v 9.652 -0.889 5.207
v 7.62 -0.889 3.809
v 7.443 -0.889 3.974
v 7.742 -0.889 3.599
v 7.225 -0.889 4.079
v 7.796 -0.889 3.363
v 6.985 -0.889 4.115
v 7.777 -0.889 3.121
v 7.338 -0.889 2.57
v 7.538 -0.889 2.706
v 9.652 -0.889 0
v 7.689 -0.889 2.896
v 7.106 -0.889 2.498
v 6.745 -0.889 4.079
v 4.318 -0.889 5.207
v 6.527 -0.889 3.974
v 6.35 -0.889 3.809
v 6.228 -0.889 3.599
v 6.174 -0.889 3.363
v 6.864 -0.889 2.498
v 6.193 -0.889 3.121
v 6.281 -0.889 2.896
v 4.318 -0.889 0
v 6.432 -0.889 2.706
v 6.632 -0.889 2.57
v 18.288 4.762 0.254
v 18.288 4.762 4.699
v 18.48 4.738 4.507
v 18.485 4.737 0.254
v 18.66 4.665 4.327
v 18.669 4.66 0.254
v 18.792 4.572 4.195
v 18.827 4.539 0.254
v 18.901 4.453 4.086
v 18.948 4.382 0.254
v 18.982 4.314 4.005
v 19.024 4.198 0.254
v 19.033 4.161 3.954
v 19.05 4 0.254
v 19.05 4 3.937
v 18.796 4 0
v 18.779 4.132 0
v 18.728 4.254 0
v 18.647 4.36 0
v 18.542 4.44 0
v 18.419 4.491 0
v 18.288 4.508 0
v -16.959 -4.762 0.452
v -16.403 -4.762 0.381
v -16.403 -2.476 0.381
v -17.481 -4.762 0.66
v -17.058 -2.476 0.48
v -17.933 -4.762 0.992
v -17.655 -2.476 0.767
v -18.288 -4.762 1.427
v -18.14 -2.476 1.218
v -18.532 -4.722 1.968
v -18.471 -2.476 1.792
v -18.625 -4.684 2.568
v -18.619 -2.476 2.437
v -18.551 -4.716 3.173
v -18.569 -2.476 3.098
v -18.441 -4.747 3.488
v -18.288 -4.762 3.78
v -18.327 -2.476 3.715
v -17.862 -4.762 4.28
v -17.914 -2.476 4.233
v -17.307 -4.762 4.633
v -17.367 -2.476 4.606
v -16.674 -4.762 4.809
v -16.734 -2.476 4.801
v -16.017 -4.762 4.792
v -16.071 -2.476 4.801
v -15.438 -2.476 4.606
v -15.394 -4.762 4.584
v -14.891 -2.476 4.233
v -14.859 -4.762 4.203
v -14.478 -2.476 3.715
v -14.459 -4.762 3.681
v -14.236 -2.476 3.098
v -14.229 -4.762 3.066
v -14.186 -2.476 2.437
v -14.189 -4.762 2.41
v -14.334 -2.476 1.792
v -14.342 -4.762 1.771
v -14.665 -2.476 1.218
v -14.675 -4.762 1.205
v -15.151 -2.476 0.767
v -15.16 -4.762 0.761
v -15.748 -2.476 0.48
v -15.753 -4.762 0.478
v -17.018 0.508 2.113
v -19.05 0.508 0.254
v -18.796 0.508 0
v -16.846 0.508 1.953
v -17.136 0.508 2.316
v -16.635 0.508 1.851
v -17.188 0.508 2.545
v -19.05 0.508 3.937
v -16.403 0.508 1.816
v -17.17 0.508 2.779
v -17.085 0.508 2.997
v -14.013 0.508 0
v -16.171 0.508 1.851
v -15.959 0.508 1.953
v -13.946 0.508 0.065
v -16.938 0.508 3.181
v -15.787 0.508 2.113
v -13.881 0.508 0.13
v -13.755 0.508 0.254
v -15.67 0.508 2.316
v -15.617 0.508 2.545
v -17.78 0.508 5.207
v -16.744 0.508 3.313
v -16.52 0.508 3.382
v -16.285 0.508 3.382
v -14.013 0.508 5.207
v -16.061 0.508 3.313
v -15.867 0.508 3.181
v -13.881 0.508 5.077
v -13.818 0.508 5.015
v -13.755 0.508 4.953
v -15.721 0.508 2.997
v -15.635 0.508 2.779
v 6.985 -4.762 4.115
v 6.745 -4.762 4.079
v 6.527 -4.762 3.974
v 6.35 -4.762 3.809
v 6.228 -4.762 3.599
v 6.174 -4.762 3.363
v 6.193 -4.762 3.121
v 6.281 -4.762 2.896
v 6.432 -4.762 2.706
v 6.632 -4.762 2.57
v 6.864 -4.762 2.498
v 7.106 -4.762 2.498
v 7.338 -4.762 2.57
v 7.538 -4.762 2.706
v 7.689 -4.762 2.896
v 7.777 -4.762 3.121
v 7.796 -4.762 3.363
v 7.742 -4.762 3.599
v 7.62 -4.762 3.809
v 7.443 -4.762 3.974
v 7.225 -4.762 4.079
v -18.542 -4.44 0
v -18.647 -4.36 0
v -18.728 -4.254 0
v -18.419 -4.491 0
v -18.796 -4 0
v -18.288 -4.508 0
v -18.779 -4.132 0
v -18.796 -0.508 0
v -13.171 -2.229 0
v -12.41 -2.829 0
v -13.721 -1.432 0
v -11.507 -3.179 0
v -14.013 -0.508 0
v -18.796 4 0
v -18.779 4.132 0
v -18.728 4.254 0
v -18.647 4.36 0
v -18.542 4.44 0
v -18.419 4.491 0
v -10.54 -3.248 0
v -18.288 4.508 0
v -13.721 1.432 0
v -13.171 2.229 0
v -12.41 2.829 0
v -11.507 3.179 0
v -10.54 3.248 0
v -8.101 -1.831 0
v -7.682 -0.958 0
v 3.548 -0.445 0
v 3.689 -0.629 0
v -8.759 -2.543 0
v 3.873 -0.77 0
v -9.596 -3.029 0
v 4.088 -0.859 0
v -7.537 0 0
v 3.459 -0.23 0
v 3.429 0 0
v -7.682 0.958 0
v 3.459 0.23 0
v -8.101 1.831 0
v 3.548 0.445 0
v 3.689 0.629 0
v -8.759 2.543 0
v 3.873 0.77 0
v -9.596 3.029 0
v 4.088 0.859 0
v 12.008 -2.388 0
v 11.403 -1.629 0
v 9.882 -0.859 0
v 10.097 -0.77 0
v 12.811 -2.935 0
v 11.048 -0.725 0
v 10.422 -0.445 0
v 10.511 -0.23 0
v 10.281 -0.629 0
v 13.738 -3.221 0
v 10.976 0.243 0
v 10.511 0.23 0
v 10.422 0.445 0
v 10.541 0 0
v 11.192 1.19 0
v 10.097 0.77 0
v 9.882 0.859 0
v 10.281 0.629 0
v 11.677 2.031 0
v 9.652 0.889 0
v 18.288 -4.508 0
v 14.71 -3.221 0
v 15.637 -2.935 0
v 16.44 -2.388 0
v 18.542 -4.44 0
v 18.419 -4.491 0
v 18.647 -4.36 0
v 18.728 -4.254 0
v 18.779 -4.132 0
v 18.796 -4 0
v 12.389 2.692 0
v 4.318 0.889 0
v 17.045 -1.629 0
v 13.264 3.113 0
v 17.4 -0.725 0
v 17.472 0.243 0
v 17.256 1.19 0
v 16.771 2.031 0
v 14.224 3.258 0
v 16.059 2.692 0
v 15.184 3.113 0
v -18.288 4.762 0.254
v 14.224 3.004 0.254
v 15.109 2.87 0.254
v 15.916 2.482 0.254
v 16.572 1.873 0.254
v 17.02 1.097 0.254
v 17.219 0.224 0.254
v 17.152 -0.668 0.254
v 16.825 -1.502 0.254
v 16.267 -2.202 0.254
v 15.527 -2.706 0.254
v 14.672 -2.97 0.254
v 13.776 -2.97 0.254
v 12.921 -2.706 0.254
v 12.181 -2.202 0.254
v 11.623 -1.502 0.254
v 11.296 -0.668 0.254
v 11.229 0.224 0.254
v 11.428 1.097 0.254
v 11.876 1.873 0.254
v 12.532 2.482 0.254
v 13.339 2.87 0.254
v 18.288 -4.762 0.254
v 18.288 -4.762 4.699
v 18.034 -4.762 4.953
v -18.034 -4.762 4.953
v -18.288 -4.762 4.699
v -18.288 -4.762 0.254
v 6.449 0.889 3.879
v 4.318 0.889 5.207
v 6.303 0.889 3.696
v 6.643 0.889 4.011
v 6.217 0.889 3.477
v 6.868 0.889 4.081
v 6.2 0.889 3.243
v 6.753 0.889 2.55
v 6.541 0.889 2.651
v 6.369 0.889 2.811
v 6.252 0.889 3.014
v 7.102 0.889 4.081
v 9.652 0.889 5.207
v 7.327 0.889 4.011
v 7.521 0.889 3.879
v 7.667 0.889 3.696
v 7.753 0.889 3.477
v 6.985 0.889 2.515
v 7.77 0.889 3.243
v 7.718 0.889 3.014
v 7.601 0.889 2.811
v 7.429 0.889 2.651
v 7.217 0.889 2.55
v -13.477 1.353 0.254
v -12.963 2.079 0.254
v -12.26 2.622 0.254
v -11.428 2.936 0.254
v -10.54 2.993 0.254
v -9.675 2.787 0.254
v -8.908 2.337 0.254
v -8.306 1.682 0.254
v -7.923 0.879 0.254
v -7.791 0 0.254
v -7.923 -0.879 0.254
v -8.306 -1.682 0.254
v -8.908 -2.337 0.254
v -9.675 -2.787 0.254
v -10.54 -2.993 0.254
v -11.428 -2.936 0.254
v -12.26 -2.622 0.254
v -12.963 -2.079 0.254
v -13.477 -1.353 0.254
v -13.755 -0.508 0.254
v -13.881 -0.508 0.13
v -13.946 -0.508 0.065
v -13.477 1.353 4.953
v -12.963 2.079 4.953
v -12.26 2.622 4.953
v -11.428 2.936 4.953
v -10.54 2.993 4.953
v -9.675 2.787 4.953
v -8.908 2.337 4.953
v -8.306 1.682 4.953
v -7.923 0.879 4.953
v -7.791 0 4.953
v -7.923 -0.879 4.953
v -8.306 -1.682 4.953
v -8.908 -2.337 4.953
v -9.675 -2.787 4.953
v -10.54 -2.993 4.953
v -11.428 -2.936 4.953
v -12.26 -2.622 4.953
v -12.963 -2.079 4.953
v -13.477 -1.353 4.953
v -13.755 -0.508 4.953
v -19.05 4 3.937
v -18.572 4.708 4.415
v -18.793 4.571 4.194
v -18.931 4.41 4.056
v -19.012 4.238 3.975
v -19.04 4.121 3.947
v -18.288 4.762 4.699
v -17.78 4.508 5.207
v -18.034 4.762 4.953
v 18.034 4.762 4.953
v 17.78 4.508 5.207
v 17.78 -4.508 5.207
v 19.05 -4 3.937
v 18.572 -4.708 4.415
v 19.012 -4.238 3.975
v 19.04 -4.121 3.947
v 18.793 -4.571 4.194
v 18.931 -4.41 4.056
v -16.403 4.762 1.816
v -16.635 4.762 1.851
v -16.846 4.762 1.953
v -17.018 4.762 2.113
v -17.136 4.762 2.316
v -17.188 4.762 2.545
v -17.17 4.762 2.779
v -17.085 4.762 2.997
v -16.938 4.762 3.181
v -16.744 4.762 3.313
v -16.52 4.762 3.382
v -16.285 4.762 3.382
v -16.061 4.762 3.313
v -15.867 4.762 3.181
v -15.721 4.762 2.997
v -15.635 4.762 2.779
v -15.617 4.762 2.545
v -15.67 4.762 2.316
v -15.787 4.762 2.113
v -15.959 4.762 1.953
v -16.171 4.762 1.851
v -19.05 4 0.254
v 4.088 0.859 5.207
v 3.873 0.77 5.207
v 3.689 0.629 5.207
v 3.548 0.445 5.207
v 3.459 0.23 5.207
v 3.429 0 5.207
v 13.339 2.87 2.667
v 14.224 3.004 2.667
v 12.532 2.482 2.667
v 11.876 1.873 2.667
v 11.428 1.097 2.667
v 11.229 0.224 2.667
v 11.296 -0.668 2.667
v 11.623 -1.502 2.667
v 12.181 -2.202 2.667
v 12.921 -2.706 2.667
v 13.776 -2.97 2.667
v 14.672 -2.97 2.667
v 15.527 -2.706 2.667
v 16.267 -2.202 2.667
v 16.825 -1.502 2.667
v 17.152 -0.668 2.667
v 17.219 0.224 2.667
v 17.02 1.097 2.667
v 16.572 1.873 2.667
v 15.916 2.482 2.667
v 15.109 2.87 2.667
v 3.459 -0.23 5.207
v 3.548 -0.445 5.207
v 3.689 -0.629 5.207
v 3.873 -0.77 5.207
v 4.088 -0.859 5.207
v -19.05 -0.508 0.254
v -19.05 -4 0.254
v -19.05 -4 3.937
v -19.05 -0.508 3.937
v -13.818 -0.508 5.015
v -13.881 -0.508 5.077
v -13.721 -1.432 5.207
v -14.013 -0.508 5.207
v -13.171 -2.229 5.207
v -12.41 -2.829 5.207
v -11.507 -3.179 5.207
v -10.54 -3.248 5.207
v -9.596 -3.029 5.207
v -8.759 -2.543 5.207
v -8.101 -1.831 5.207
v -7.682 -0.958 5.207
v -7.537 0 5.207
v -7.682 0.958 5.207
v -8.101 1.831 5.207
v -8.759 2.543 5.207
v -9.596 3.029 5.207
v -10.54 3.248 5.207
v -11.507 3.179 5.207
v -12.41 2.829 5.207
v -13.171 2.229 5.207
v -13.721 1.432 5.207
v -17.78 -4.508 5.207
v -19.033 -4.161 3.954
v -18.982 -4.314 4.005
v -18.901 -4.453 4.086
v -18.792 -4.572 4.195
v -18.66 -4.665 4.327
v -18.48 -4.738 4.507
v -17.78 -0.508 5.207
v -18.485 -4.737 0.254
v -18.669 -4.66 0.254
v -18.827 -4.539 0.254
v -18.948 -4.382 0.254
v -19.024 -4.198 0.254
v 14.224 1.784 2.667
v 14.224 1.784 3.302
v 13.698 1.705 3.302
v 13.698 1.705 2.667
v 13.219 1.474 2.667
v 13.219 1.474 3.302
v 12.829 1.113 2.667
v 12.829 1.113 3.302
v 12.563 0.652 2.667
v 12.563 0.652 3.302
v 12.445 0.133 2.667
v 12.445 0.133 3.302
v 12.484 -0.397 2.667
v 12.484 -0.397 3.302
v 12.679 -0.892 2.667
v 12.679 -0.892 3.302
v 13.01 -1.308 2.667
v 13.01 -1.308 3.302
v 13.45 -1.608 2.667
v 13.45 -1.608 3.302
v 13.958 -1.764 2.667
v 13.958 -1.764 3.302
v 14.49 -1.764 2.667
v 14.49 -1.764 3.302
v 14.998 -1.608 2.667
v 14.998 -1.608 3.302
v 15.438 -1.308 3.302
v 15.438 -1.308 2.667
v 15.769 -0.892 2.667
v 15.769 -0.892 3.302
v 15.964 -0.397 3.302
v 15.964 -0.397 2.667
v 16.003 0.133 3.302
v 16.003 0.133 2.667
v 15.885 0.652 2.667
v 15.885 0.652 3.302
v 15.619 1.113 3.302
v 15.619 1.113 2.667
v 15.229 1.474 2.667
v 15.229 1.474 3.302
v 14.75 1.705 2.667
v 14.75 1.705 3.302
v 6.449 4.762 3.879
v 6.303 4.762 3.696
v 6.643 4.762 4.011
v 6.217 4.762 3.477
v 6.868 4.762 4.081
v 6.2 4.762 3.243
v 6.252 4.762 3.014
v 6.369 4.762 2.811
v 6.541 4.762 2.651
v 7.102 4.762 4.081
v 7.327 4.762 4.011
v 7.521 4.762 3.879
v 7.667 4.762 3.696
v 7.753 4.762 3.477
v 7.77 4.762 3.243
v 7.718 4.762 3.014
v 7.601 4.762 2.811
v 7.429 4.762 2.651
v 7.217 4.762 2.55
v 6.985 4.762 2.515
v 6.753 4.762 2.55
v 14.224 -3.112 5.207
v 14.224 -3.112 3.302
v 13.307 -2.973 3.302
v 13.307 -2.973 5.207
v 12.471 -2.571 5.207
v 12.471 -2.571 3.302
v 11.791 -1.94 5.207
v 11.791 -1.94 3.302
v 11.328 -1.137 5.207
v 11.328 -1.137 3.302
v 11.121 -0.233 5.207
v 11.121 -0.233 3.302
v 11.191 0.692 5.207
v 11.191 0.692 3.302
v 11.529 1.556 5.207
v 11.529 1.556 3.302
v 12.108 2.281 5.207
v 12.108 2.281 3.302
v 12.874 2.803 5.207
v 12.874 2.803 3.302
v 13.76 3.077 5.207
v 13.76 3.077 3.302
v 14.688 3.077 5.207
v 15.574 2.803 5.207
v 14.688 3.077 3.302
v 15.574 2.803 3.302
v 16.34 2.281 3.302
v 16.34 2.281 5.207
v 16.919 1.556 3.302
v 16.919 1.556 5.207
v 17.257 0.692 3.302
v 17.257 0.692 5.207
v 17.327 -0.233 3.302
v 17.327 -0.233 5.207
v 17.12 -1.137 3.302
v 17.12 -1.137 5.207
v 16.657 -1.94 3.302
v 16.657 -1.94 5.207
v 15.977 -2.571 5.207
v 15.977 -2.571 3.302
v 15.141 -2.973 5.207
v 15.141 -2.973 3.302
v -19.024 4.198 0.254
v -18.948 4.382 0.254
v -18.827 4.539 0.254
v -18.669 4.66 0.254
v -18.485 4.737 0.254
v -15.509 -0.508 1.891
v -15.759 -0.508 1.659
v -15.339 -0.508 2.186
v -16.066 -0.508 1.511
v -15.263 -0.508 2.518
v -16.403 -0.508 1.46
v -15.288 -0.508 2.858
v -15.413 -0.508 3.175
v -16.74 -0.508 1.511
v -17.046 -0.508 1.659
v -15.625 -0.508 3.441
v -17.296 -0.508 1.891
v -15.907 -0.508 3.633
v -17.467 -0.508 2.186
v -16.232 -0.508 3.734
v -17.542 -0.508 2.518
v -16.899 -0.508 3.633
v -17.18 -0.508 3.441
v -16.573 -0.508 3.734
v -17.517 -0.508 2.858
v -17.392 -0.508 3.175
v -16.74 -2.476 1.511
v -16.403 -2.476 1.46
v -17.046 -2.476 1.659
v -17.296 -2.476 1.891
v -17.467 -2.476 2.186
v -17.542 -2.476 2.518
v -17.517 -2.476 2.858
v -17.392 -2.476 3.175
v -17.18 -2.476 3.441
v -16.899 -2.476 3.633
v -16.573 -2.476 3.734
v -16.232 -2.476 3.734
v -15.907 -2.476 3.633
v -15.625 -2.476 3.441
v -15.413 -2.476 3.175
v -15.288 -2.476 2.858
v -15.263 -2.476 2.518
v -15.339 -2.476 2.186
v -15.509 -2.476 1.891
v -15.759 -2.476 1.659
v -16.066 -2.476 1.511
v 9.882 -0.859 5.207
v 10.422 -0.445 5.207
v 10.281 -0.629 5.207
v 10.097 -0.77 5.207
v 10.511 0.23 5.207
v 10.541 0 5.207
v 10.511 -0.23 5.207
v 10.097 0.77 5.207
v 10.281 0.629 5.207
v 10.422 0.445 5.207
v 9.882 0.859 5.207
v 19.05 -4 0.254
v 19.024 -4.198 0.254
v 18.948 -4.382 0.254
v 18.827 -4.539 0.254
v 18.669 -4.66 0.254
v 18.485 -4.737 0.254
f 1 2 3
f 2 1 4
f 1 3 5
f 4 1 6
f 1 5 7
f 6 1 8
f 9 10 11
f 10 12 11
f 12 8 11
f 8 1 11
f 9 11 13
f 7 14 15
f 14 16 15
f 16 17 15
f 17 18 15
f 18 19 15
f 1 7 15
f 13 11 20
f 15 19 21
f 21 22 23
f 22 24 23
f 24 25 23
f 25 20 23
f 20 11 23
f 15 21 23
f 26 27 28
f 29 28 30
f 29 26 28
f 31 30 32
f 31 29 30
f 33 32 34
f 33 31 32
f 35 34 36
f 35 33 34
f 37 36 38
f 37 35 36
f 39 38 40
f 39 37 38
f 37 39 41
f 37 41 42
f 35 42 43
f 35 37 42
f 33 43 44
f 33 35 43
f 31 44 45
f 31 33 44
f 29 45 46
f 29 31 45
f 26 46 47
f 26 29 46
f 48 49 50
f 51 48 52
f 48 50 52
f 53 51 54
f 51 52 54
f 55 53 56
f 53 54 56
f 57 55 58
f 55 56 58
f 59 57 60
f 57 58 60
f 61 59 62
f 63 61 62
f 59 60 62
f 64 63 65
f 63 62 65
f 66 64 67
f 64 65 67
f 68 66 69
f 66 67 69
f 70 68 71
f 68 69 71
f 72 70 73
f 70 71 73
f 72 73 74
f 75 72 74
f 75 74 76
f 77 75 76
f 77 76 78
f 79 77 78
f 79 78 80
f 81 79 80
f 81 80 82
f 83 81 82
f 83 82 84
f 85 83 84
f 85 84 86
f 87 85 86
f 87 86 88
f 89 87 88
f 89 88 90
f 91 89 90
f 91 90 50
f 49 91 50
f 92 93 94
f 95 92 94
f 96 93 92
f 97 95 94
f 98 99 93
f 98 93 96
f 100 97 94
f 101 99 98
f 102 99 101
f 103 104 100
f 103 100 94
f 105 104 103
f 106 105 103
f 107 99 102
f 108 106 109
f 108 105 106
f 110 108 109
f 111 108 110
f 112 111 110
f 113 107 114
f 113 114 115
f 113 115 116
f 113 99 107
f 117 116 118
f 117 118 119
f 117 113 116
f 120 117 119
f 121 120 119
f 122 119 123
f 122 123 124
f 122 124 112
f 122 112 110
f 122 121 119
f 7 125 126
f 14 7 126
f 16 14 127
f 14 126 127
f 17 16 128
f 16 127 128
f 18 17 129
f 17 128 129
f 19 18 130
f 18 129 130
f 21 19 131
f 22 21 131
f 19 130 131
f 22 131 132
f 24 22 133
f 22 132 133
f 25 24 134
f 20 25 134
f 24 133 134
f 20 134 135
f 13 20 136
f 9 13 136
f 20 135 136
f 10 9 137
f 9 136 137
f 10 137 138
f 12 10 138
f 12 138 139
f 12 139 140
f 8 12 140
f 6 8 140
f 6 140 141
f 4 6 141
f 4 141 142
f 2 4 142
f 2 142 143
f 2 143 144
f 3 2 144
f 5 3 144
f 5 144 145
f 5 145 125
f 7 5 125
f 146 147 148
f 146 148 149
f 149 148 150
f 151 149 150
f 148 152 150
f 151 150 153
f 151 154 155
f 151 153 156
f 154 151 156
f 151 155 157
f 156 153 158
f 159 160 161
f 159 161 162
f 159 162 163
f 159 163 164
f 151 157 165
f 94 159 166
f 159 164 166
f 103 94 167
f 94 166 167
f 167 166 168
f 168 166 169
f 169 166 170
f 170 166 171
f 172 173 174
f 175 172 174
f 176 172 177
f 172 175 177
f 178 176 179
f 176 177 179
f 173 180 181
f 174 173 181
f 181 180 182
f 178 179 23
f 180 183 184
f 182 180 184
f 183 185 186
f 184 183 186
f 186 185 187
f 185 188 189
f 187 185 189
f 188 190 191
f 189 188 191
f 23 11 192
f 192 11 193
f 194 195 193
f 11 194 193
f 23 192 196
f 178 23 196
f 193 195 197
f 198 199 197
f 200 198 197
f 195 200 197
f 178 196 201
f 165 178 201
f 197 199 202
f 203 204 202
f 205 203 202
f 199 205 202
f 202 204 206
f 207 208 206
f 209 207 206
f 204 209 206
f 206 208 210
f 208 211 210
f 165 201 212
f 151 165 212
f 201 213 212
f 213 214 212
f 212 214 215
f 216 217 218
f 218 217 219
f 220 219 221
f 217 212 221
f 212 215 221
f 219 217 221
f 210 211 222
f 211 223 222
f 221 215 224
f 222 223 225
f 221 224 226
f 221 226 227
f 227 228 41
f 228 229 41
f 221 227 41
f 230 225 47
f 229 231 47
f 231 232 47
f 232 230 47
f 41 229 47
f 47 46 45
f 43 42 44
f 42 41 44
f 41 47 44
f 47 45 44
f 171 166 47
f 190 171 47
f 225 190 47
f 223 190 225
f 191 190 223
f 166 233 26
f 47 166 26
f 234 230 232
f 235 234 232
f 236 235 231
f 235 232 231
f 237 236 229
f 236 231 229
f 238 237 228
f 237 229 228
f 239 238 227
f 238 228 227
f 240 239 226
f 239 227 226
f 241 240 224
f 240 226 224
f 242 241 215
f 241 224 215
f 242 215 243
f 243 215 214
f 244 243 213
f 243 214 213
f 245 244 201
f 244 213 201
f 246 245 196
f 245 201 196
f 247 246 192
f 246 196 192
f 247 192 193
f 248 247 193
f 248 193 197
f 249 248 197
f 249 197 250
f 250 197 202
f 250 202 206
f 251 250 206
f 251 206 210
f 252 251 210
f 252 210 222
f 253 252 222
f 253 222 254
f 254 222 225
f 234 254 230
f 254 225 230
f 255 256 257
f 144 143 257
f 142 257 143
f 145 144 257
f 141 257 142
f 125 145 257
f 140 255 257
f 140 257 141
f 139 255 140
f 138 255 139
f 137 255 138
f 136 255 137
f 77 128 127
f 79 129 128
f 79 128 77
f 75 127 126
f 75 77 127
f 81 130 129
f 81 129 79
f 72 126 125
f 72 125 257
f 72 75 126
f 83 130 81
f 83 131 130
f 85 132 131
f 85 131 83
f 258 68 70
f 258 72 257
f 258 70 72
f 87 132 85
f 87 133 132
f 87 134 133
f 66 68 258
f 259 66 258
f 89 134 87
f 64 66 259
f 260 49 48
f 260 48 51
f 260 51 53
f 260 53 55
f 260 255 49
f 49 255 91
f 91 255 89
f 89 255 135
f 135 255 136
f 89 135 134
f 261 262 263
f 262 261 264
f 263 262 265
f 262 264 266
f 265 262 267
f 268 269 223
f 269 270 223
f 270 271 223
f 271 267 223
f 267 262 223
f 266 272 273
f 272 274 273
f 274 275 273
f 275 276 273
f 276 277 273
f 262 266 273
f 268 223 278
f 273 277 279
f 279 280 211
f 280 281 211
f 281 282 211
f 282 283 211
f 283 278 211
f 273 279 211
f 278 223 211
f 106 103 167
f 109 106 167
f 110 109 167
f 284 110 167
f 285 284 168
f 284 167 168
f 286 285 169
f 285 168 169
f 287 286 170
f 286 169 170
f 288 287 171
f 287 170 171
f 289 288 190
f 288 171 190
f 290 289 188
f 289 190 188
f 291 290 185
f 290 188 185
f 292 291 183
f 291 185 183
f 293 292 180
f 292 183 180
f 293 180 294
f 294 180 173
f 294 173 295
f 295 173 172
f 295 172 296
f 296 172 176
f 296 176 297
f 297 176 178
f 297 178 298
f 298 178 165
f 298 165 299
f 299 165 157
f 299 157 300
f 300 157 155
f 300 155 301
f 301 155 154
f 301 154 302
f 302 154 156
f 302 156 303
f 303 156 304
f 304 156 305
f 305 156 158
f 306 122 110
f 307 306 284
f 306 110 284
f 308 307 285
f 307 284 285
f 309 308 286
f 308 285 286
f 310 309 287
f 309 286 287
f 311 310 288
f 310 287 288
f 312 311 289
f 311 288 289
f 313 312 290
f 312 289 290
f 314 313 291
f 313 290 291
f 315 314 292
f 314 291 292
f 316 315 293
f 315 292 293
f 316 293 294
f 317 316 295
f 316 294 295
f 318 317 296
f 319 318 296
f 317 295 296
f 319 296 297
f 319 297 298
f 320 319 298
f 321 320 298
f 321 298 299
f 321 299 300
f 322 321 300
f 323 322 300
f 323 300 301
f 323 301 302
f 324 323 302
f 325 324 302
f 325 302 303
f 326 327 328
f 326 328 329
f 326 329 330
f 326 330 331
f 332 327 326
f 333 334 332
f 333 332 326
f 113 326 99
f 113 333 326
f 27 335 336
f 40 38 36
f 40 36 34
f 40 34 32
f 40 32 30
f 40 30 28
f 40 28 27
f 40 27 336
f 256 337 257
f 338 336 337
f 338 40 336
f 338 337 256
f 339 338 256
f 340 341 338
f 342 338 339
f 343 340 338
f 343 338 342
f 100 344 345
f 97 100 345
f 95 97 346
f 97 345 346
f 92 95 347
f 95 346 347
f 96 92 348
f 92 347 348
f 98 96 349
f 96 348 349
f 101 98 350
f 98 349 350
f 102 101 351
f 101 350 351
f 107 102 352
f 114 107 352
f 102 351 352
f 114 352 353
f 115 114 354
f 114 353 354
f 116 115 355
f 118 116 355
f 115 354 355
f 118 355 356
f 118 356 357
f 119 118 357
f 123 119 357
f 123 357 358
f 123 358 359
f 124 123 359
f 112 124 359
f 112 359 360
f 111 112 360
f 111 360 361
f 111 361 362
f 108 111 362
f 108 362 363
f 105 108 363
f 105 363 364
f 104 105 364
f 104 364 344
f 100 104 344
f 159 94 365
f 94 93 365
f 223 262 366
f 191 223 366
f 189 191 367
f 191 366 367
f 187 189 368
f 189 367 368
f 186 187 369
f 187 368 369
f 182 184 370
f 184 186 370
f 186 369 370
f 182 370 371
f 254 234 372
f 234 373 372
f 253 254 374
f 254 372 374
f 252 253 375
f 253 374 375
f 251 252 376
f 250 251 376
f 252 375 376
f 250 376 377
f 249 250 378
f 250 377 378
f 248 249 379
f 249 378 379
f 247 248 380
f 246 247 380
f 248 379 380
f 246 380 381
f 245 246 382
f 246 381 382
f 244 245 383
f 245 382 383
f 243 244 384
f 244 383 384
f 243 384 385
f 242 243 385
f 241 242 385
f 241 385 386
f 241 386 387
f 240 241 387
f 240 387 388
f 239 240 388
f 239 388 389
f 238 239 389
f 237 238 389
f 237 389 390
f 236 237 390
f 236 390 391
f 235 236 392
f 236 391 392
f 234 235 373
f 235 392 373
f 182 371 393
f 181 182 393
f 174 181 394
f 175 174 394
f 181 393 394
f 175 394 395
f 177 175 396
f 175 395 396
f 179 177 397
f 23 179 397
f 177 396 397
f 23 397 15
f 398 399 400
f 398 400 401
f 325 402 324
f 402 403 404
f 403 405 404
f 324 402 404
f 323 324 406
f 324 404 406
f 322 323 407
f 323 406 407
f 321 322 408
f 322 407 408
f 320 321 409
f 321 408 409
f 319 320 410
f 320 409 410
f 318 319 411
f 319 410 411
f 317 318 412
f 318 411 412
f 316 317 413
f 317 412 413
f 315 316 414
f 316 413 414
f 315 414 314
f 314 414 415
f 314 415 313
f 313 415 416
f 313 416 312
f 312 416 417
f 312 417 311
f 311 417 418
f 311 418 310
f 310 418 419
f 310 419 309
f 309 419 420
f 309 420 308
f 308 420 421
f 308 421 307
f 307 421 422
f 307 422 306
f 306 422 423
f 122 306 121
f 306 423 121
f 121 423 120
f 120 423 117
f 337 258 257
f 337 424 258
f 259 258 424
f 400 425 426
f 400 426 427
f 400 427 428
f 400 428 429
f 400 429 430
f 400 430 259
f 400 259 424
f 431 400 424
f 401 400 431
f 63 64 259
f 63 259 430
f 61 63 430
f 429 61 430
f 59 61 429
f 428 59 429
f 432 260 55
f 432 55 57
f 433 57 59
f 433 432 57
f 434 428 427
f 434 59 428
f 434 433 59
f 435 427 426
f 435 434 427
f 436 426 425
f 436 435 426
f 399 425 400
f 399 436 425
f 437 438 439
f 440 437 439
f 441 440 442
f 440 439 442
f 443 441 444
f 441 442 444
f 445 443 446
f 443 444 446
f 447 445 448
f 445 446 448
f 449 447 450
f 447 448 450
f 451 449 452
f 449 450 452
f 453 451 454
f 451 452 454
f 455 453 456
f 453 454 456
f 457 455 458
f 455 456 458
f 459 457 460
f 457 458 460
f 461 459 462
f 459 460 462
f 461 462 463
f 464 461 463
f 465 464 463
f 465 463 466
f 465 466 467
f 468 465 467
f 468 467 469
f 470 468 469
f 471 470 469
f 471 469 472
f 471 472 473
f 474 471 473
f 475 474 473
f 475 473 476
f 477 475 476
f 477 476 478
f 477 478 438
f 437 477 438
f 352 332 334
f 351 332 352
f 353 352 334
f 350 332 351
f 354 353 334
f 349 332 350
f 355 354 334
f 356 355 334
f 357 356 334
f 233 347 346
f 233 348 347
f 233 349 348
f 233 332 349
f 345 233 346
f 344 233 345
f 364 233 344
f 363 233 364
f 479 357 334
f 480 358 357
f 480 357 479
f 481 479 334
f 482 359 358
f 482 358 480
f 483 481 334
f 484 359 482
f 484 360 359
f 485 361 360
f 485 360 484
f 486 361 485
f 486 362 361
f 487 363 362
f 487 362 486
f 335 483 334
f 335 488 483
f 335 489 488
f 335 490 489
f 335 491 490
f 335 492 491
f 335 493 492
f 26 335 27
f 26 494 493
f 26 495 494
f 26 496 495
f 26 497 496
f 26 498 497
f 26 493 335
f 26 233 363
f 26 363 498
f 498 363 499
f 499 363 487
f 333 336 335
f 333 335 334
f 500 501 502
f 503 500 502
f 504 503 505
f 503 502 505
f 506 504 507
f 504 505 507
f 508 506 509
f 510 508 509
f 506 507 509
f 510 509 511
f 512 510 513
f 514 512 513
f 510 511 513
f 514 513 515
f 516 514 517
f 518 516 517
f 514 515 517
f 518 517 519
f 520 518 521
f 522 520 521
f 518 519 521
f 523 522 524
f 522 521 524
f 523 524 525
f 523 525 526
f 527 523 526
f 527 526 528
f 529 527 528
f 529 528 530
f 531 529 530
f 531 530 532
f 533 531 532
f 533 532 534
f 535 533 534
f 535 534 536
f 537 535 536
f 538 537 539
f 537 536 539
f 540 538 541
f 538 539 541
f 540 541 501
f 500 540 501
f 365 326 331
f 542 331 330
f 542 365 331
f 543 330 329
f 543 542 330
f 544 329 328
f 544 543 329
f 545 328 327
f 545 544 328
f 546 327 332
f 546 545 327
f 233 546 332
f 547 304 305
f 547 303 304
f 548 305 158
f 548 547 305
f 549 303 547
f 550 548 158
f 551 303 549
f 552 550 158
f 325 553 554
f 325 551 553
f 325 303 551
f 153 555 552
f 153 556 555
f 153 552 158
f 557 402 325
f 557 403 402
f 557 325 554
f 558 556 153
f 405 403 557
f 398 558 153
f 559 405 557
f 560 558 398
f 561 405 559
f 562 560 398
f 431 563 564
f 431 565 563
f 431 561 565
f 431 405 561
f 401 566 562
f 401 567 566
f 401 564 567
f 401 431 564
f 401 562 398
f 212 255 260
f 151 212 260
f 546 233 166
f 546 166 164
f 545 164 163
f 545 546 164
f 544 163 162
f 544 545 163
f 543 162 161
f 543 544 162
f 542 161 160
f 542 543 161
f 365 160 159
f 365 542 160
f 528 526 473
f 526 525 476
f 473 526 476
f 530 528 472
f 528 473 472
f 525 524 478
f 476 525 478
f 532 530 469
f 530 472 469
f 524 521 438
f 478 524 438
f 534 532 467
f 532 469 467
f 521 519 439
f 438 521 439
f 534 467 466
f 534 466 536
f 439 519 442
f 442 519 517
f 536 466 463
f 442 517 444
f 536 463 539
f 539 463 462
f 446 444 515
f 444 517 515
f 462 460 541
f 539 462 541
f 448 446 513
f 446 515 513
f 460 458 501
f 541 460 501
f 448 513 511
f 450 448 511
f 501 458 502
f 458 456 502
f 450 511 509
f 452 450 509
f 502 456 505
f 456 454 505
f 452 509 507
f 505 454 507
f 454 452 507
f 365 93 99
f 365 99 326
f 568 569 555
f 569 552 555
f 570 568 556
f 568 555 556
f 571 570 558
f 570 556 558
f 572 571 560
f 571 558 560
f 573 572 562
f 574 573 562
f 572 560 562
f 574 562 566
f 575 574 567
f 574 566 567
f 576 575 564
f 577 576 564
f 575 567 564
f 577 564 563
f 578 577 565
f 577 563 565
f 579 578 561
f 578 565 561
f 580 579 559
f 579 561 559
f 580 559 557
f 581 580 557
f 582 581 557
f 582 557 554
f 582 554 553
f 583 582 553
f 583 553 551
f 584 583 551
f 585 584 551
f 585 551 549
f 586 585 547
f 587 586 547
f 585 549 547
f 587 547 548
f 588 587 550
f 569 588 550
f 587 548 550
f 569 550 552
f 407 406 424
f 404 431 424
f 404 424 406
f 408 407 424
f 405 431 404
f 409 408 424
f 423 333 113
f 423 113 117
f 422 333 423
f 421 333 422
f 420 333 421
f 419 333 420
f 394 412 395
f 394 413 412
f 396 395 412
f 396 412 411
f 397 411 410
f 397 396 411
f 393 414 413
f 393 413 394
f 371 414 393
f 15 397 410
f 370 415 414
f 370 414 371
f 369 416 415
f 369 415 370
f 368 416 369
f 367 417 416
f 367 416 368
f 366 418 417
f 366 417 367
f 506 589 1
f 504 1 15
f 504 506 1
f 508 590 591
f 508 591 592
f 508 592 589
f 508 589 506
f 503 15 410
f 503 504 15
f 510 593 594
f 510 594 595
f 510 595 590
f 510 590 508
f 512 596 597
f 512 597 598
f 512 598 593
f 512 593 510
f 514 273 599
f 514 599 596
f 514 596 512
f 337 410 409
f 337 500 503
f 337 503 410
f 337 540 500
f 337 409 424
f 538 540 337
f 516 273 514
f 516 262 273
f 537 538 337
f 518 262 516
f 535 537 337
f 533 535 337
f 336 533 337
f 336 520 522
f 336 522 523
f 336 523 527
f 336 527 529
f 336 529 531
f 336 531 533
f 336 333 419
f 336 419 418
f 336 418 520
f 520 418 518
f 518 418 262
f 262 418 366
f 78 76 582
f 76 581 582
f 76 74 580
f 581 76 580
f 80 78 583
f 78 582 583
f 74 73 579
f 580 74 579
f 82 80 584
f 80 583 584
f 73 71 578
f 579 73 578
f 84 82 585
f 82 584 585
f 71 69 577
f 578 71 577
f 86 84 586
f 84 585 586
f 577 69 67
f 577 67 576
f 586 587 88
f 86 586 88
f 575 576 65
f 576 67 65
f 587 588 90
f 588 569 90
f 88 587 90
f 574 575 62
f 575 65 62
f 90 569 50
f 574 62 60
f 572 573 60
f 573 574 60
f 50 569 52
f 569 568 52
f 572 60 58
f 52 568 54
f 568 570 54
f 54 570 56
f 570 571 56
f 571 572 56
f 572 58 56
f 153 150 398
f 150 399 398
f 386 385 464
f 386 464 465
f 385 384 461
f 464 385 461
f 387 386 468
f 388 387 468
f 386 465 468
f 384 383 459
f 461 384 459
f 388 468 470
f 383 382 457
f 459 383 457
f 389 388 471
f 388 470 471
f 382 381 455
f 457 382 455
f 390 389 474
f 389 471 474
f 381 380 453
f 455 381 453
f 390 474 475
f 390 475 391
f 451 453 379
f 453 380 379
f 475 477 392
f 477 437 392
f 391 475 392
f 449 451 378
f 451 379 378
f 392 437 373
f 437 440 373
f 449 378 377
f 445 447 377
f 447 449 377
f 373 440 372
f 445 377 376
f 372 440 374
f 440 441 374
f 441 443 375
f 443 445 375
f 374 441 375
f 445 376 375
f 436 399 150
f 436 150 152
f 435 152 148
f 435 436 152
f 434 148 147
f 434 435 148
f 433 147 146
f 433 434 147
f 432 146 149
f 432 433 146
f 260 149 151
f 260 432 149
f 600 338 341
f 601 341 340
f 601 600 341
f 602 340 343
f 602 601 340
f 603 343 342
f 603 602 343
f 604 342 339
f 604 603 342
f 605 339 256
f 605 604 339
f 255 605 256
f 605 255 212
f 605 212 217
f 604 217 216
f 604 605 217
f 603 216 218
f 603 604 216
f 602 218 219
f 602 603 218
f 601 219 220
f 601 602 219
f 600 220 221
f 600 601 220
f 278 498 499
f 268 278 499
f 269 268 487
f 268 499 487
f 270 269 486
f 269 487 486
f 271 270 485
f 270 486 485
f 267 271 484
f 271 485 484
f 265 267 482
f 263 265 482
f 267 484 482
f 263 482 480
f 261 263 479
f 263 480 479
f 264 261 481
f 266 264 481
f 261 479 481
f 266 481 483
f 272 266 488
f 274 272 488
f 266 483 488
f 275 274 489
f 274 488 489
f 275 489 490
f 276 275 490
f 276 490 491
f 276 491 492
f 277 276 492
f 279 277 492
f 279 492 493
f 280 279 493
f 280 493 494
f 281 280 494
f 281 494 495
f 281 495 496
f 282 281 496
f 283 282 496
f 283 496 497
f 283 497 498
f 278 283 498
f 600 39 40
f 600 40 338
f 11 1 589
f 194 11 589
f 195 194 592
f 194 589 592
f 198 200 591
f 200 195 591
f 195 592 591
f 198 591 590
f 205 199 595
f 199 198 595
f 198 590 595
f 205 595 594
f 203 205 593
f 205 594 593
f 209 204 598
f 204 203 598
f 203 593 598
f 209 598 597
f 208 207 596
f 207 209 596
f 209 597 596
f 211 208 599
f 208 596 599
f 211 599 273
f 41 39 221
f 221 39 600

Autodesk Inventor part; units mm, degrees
ref_plane "YZ Plane" through (0, 0, 0) normal (1, 0, 0) x (0, 1, 0)
ref_plane "XZ Plane" through (0, 0, 0) normal (0, 1, 0) x (-1, 0, 0)
ref_plane "XY Plane" through (0, 0, 0) normal (0, 0, 1) x (1, 0, 0)
sketch "Sketch1" plane through (0, 0, 0) normal (0, 0, 1) x (1, 0, 0)
  line L0 (-19.05, 4.7625) -> (19.05, 4.7625)
  line L1 (19.05, 4.7625) -> (19.05, -4.7625)
  line L2 (19.05, -4.7625) -> (-19.05, -4.7625)
  line L3 (-19.05, -4.7625) -> (-19.05, 4.7625)
  point P0 (0, 0)
  point P1 (-19.05, 0)
  point P2 (0, 4.7625)
  dimension "d0" = 38.1
  dimension "d1" = 9.525
extrude "Extrusion1" add sketch "Sketch1" along normal blind 5.207
sketch "Sketch2" plane through (0, 0, 5.207) normal (0, 0, 1) x (1, 0, 0)
  line L0 (-19.05, -4.7625) -> (-19.05, 4.7625) projected
  point P0 (0, 0)
  point P1 (-10.795, 0)
  dimension "d4" = 8.255
hole "Hole1" at (-10.795, 0, 5.207) direction (0, 0, -1) diameter 6.0071 end through all
sketch "Sketch4" plane through (0, 0, 0) normal (1, 0, 0) x (0, 1, 0)
  circle A0 centre (0, 4.1099) radius 1.778
  point P0 (0, 0)
  dimension "d18" = 3.556
sketch "Sketch8" plane through (0, 0, 0) normal (0, 0, -1) x (-1, 0, 0)
  circle A0 centre (10.795, 0) radius 3.0035 projected
  circle A1 centre (10.795, 0) radius 4.7625 construction
  circle A2 centre (10.795, 0) radius 3.1115
  line L0 (-19.05, 4.7625) -> (-19.05, -4.7625) projected
  line L1 (19.05, 4.7625) -> (-19.05, 4.7625) projected
  line L2 (-19.05, -4.7625) -> (19.05, -4.7625) projected
  line L3 (19.05, -4.7625) -> (19.05, 4.7625) projected
  line L4 (-19.05, 4.7625) -> (19.05, 4.7625)
  line L5 (19.05, 4.7625) -> (19.05, -4.7625)
  line L6 (19.05, -4.7625) -> (-19.05, -4.7625)
  line L7 (-19.05, -4.7625) -> (-19.05, 4.7625)
  point P0 (17.78, -4.7625)
  point P1 (17.78, 4.7625)
  point P2 (0, 0)
  dimension "d52" = 9.525
  dimension "d53" = 6.223
extrude "Extrusion4" [suppressed]
sketch "Sketch9" plane through (0, 0, 0) normal (0, 0, 1) x (1, 0, 0)
  line L0 (3.429, 0.889) -> (10.541, 0.889)
  line L1 (10.541, 0.889) -> (10.541, -0.889)
  line L2 (10.541, -0.889) -> (3.429, -0.889)
  line L3 (3.429, -0.889) -> (3.429, 0.889)
  line L4 (10.541, 0) -> (3.429, 0) construction
  line L5 (6.985, 0.889) -> (6.985, -0.889) construction
  circle A0 centre (-10.795, 0) radius 3.0035 projected
  point P0 (0, 0)
  dimension "d60" = 7.112
  dimension "d61" = 1.778
  dimension "d130" = 17.78
extrude "Extrusion5" cut sketch "Sketch9" along normal up to next contours L0 L1 L2 L3
sketch "Sketch11" plane through (0, 0, 0) normal (0, 0, 1) x (1, 0, 0)
  line L0 (-26.67, 0) -> (26.67, 0) projected
  circle A0 centre (-10.795, 0) radius 3.0035 projected
  point P0 (0, 0)
  point P1 (14.224, 0)
  dimension "d131" = 25.019
hole "Hole5" at (14.224, 0, 0) direction (0, 0, 1) diameter 3.5687 end through all counterbore diameter 6.0071 counterbore depth 2.667
sketch "Sketch13" plane through (0, 0, 0) normal (0, 1, 0) x (-1, 0, 0)
  line L0 (-10.541, 0) -> (-10.541, 5.207) projected
  line L1 (-3.429, 0) -> (-3.429, 5.207) projected
  line L2 (-10.541, 5.207) -> (-3.429, 5.207) construction
  line L3 (-6.985, 5.207) -> (-6.985, 3.302) construction
  point P0 (0, 0)
  point P1 (-8.89, 0.381)
  point P2 (-1.27, 0.381)
  dimension "d98" = 1.905
hole "Hole6" at (6.985, 0, 3.302) direction (0, -1, 0) diameter 1.6256 end through all
hole "Hole7" at (6.985, 0, 3.302) direction (0, 1, 0) diameter 1.5748 end through all
sketch "Sketch18" plane through (0, 0, 5.207) normal (0, 0, 1) x (1, 0, 0)
  circle A0 centre (-10.795, 0) radius 3.0035 projected
  line L0 (-19.05, -4.7625) -> (-19.05, 4.7625) projected
  line L1 (-19.05, 0.508) -> (-13.7553, 0.508)
  line L2 (-13.7553, 0.508) -> (-13.7553, -0.508)
  line L3 (-13.7553, -0.508) -> (-19.05, -0.508)
  line L4 (-19.05, -0.508) -> (-19.05, 0.508)
  line L5 (-19.05, 0) -> (-13.7553, 0) construction
  point P0 (0, 0)
  point P1 (-19.05, 0)
  dimension "d132" = 1.016
extrude "Extrusion7" cut sketch "Sketch18" against normal up to next contours L2 A0 | A0 L3 L0 L1 picked at (-13.7681, 0.0567)
sketch "Sketch19" plane through (-19.05, -4.7625, 0) normal (0, -1, 0) x (1, 0, 0)
  line L0 (38.1, 5.207) -> (0, 5.207) projected
  line L1 (0, 0) -> (0, 5.207) projected
  line L2 (5.2947, 0) -> (5.2947, 5.207) construction
  line L3 (0, 2.6035) -> (5.2947, 2.6035) construction
  line L4 (2.6474, 2.6035) -> (2.6474, 5.207) construction
  circle A0 centre (2.6474, 2.6035) radius 2.2225 construction
  point P0 (19.05, 0)
  dimension "d136" = 0
  dimension "d137" = 4.445
hole "Hole9" at (-16.4026, -4.7625, 2.6035) direction (0, 1, 0) diameter 2.286 end up to surface counterbore diameter 4.445 counterbore depth 2.286
hole "Hole10" at (-16.4026, 0.508, 2.6035) direction (0, 1, 0) diameter 1.5748 end through all
sketch "Sketch20" plane through (0, 0, 5.207) normal (0, 0, 1) x (1, 0, 0)
  circle A0 centre (14.224, 0) radius 1.7844 projected
  point P0 (0, 0)
hole "Hole11" at (14.224, 0, 5.207) direction (0, 0, -1) diameter 6.223 depth 1.905
chamfer "Chamfer9" distance 1.27 angle 45 3 edges at (19.05, 0, 5.207) (-19.05, 2.6352, 5.207) (-19.05, -2.6353, 5.207)
sketch "Sketch15" plane through (0, 0, 0) normal (1, 0, 0) x (0, 1, 0)
  point P0 (0, 0)
sketch "Sketch16" plane through (0, 0, 5.207) normal (0, 0, 1) x (1, 0, 0)
  circle A0 centre (14.224, 0) radius 1.7844 projected
  line L0 (10.541, 0.889) -> (10.541, -0.889) projected
  line L1 (10.541, -0.889) -> (3.429, -0.889) projected
  line L2 (3.429, -0.889) -> (3.429, 0.889) projected
  line L3 (3.429, 0.889) -> (10.541, 0.889) projected
  circle A1 centre (-12.7, 0) radius 3.0035 projected
  line L4 (19.05, 4.7625) -> (19.05, -4.7625) projected
  line L5 (-19.05, 4.7625) -> (19.05, 4.7625) projected
  line L6 (-19.05, -4.7625) -> (-19.05, 4.7625) projected
  line L7 (19.05, -4.7625) -> (-19.05, -4.7625) projected
  point P0 (0, 0)
sketch "Sketch14" plane through (0, 0, 5.207) normal (0, 0, 1) x (1, 0, 0)
  circle A0 centre (6.985, 0) radius 4.1275
  line L0 (10.541, 0.889) -> (10.541, -0.889) projected
  line L1 (10.541, -0.889) -> (3.429, -0.889) projected
  line L2 (3.429, -0.889) -> (3.429, 0.889) projected
  line L3 (3.429, 0.889) -> (10.541, 0.889) projected
  line L4 (-17.78, 4.7625) -> (17.78, 4.7625) projected
  line L5 (17.78, -4.7625) -> (-17.78, -4.7625) projected
  line L6 (6.1976, 0.889) -> (6.1976, 4.7625) projected
  line L7 (7.7724, 0.889) -> (7.7724, 4.7625) projected
  line L8 (6.1976, 4.7625) -> (7.7724, 4.7625) construction
  line L9 (6.985, 4.7625) -> (6.985, -4.7625) construction
  line L10 (-13.7553, -0.508) -> (-17.78, -0.508) projected
  line L11 (-17.78, 0.508) -> (-13.7553, 0.508) projected
  arc A1 (-13.7553, -0.508) -> (-13.7553, 0.508) centre (-10.795, 0) ccw projected
  line L12 (17.78, 4.7625) -> (17.78, -4.7625) projected
  line L13 (-17.78, -4.7625) -> (-17.78, -0.508) projected
  line L14 (-17.78, 0.508) -> (-17.78, 4.7625) projected
  point P0 (0, 0)
  dimension "d113" = 8.255
extrude "Extrusion6" [suppressed]
fillet "Fillet4" radius 0.889 4 edges at (10.541, 0.889, 2.6035) (10.541, -0.889, 2.6035) (3.429, 0.889, 2.6035) (3.429, -0.889, 2.6035)
fillet "Fillet5" radius 0.762 4 edges at (-19.05, 4.7625, 1.9685) (-19.05, -4.7625, 1.9685) (19.05, 4.7625, 1.9685) (19.05, -4.7625, 1.9685)
chamfer "Chamfer5" distance 0.254 angle 45 11 edges at (0, 4.7625, 5.207) (0, -4.7625, 5.207) (-19.05, -2.2543, 0) (-18.8268, -4.5393, 0) (0, -4.7625, 0) (18.8268, -4.5393, 0) (19.05, 0, 0) (18.8268, 4.5393, 0) (0, 4.7625, 0) (-18.8268, 4.5393, 0) (-19.05, 2.2542, 0)
sketch "Sketch12" plane through (0, 0, 0) normal (0, 1, 0) x (-1, 0, 0)
  point P0 (0, 0)
chamfer "Chamfer8" distance 0.254 angle 45 3 edges at (-7.7914, 0, 0) (14.224, -3.0035, 0) (-7.7914, 0, 5.207)
properties part number "J002886" material "ALUMINUM, 6061-T651"
